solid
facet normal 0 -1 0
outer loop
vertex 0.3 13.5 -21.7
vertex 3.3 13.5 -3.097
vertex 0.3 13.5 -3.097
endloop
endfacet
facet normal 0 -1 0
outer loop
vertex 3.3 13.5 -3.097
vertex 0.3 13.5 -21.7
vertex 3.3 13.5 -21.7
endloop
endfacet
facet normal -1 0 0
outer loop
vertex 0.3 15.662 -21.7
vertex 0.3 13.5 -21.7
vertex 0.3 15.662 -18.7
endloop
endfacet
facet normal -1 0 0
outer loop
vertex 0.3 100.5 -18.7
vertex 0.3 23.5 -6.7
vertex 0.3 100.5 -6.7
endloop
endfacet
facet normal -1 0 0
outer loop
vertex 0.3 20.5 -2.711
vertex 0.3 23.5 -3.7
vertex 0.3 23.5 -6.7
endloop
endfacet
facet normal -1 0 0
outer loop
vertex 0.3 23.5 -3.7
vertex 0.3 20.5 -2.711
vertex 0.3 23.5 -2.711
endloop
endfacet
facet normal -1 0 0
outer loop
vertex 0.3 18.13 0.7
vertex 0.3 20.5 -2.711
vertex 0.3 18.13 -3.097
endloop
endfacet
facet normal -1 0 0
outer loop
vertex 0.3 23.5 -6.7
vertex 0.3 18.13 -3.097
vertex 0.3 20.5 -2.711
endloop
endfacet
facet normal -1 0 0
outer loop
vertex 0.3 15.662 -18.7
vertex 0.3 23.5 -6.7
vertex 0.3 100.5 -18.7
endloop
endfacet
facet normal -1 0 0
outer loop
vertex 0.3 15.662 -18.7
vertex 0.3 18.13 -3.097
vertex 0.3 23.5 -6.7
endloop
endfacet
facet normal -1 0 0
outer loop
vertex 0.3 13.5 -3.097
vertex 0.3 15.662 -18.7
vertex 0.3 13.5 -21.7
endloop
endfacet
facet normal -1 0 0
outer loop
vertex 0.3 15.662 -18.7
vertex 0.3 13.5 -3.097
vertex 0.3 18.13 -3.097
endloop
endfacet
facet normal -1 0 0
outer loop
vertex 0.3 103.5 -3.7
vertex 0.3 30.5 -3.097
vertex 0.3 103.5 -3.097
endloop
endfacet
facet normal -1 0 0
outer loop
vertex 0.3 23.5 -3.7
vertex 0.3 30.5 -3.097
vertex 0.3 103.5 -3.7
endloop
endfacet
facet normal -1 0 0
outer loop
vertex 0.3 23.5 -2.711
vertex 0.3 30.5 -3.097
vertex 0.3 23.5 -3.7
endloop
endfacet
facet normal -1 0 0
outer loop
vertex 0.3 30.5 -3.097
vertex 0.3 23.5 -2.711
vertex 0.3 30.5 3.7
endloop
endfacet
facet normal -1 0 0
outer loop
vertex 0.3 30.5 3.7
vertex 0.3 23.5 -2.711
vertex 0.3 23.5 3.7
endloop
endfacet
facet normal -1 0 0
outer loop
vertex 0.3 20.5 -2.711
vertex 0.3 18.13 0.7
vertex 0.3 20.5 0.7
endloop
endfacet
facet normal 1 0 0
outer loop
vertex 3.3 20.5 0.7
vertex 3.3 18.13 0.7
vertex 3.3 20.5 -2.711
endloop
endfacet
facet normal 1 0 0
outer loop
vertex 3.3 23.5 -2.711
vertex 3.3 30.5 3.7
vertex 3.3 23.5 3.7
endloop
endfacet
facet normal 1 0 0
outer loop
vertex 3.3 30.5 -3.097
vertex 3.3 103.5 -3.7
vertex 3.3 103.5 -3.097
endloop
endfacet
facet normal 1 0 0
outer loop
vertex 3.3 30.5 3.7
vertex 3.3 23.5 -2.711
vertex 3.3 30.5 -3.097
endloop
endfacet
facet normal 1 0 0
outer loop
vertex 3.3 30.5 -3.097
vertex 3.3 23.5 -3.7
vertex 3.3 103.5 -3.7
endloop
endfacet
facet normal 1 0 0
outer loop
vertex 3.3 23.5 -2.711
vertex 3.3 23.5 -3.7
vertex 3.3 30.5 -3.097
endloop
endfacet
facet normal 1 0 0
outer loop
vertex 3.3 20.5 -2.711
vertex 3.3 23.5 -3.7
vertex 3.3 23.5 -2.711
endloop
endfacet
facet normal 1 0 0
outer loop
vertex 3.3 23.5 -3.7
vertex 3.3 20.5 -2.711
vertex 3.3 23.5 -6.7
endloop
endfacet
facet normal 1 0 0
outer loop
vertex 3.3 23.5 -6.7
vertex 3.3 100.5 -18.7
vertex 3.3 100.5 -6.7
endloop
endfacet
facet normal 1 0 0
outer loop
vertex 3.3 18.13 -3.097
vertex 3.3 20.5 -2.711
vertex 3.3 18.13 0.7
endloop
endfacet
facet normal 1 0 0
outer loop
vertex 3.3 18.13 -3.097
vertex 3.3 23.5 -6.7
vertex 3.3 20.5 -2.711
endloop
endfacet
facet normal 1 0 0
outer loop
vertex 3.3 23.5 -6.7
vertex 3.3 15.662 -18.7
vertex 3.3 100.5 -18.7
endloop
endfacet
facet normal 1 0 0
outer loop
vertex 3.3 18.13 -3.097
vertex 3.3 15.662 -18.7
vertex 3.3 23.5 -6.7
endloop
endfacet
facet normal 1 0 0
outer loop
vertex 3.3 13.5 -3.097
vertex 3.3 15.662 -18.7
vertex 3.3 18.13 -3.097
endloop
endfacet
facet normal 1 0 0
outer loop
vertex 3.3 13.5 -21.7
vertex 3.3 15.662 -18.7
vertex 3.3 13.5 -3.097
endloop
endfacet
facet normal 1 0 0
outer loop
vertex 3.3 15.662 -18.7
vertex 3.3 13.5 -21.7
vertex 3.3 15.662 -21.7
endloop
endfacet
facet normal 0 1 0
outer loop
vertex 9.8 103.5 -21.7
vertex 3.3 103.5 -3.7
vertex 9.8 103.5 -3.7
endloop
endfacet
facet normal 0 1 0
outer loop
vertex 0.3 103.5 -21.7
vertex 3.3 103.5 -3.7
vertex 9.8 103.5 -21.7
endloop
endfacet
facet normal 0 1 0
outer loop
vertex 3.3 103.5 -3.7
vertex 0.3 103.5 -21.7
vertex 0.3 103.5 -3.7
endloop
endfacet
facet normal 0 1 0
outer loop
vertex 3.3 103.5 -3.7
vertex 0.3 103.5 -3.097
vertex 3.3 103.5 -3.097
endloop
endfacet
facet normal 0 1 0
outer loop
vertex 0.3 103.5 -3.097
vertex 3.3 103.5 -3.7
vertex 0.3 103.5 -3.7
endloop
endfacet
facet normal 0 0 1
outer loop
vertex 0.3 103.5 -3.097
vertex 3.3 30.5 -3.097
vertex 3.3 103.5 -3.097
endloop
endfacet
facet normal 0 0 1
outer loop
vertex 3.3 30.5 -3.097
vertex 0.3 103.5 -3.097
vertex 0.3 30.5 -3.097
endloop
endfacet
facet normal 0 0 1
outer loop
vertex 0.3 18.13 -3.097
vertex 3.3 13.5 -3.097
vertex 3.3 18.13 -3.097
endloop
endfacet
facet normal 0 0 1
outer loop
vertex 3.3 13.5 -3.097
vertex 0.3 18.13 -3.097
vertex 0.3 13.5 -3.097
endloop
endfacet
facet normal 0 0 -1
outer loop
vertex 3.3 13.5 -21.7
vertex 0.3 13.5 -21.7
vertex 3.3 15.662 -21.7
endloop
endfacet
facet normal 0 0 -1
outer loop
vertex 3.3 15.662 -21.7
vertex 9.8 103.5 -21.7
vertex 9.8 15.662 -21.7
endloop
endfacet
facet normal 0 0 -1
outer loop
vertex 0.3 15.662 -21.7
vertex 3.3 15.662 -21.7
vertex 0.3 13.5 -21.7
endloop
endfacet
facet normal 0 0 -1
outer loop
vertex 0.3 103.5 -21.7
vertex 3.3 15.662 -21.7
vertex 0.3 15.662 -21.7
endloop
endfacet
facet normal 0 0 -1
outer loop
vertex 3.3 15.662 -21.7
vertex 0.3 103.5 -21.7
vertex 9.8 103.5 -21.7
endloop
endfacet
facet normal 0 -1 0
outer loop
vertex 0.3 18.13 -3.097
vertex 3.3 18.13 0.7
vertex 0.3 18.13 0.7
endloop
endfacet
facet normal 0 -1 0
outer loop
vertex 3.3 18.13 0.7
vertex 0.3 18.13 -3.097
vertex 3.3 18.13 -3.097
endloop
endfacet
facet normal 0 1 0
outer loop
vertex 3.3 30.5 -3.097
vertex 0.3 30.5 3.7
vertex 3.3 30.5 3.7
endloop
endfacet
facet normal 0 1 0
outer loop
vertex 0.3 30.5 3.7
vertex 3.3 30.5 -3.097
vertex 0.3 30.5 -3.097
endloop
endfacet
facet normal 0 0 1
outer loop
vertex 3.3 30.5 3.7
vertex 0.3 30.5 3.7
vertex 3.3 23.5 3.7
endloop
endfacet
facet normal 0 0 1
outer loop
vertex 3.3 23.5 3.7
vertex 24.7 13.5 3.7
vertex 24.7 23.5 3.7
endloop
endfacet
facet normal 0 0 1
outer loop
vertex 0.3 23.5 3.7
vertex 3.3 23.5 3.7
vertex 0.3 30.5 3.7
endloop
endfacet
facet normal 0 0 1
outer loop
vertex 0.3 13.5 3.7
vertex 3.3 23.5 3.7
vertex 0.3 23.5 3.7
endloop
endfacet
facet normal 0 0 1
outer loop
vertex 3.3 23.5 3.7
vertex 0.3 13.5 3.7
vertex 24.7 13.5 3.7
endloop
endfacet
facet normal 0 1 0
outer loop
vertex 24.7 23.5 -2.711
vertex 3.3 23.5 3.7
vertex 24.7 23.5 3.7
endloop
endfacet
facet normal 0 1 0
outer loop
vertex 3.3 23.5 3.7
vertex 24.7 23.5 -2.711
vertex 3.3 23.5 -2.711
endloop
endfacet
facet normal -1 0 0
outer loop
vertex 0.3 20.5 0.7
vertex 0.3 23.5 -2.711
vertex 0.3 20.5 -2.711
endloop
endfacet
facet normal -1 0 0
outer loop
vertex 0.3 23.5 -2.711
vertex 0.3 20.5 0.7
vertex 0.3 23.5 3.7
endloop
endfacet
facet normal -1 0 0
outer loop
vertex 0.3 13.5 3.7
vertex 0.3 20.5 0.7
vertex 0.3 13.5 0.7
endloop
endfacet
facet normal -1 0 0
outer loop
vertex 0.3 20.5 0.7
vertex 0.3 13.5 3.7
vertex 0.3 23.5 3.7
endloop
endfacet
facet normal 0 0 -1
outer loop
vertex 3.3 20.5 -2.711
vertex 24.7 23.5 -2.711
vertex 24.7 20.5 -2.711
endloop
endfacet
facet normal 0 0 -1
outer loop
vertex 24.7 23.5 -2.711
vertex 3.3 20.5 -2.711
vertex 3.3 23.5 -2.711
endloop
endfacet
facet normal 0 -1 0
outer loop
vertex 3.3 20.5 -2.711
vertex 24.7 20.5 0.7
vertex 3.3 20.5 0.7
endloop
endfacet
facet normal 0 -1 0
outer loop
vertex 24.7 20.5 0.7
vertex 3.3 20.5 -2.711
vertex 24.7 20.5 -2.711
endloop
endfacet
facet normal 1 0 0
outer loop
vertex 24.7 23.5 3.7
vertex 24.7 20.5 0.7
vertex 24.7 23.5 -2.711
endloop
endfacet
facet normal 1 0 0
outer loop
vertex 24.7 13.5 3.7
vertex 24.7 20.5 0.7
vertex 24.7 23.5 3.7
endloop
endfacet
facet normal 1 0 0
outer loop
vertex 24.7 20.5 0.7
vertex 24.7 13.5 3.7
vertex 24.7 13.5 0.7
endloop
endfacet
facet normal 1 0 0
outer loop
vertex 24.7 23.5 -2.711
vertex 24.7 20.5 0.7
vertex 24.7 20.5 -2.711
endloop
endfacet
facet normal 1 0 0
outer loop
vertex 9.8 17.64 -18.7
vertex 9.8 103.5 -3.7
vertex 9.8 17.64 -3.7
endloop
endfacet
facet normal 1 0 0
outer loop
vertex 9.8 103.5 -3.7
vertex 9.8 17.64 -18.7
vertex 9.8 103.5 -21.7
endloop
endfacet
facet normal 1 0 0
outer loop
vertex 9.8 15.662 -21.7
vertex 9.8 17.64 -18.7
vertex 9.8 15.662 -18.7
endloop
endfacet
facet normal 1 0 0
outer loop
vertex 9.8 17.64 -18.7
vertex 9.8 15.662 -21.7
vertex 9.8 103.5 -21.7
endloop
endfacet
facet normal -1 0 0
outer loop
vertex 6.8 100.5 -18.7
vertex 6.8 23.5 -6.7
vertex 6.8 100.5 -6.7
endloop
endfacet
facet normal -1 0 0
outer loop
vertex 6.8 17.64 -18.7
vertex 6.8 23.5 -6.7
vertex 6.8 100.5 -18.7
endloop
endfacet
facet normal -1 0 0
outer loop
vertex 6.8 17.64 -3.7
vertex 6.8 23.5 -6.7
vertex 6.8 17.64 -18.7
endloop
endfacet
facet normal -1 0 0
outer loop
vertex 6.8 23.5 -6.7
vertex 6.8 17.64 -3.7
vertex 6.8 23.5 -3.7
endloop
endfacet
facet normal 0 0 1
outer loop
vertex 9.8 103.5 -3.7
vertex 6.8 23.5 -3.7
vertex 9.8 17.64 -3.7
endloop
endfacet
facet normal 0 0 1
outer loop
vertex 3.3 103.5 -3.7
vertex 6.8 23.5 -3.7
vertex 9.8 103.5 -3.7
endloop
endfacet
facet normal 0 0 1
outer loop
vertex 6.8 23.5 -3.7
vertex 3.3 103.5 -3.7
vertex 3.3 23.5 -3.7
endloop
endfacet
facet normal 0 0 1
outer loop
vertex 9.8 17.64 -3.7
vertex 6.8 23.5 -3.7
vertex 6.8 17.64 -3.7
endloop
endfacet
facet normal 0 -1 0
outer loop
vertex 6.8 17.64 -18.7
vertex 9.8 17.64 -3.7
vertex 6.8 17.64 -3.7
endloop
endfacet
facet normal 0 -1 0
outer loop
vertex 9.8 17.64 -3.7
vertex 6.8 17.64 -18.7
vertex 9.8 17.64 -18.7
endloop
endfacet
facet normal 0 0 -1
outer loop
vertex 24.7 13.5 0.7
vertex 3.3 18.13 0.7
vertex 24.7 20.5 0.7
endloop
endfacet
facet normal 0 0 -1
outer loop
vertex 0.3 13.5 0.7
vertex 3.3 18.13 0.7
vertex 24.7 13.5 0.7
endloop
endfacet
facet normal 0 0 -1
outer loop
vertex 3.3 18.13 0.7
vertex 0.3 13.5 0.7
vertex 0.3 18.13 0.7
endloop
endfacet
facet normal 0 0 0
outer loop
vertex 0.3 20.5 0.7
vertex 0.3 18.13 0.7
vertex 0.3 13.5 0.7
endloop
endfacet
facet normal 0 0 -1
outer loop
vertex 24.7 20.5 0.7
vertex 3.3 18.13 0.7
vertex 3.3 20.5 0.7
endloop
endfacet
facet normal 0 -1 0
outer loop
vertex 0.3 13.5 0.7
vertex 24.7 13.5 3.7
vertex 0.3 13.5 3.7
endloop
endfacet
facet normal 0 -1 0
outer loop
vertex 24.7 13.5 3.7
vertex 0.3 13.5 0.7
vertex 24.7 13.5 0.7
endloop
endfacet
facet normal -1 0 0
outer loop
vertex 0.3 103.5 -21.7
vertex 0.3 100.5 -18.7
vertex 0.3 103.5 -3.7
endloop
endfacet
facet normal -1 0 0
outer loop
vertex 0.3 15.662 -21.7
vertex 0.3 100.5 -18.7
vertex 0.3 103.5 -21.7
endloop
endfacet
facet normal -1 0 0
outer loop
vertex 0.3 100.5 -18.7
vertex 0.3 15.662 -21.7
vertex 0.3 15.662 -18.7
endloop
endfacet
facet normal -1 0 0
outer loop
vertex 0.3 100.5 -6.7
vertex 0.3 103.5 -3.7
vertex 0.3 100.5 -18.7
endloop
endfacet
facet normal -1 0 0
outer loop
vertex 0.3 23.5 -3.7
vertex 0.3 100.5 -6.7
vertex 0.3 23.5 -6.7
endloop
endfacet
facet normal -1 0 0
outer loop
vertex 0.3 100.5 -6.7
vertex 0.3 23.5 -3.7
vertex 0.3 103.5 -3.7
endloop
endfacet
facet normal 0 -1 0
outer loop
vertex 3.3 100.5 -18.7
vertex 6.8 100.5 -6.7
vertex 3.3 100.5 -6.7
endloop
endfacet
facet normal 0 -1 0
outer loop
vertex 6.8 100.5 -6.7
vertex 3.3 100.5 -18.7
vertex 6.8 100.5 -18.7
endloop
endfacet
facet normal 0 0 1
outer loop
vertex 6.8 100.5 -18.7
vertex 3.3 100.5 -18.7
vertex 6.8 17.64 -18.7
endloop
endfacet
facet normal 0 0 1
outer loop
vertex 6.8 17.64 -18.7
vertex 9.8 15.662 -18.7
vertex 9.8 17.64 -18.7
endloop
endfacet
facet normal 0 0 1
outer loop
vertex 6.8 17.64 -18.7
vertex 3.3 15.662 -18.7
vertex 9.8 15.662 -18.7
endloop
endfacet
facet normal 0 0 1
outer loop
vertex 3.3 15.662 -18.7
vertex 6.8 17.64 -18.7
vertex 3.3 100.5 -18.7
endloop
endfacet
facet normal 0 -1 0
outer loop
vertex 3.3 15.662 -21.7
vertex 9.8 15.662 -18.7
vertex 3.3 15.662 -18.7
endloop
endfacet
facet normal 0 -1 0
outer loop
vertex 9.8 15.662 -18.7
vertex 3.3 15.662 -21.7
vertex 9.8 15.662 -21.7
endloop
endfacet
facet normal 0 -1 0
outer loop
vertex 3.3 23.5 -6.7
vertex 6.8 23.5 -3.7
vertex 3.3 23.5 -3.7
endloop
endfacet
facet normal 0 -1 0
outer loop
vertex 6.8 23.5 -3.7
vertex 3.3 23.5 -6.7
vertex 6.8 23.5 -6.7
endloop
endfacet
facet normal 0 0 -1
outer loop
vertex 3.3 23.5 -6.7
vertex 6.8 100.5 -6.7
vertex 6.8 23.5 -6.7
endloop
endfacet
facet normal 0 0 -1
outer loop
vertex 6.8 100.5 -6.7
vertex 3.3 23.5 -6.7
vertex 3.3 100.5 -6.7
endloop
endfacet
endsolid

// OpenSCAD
% scale(1000) import("ffld_0850ncn30_lksr00_0__3.part");

// Sketch PureShapes 3
multmatrix([[-1.0, 0.0, 0.0, 0.0], [0.0, 0.0, 1.0, 23.5], [0.0, 1.0, 0.0, 0.0], [0.0, 0.0, 0.0, 1.0]]) {
thickness = 3.000000;
translate([0, 0, -thickness]) {
  translate([-0.300000, 3.700000, 0]) {
    rotate([0, 0, 180.0]) {
      cube([24.400000, 6.411395, thickness]);
    }
  }
}
}

// Sketch PureShapes 3
multmatrix([[0.0, 2.8912057932946793e-16, 1.0, 9.79999999999995], [1.0, 0.0, 0.0, 0.0], [0.0, 1.0, -2.8912057932946793e-16, -2.833381677428771e-15], [0.0, 0.0, 0.0, 1.0]]) {
thickness = 3.000000;
translate([0, 0, -thickness]) {
  translate([103.500000, -3.700000, 0]) {
    rotate([0, 0, 180.0]) {
      cube([85.859568, 18.000000, thickness]);
    }
  }
}
}

// Sketch PureShapes 3
multmatrix([[1.0, 0.0, 0.0, 0.0], [0.0, 1.0, 0.0, 0.0], [0.0, 0.0, 1.0, 3.7], [0.0, 0.0, 0.0, 1.0]]) {
thickness = 3.000000;
translate([0, 0, -thickness]) {
  translate([0.300000, 13.500000, 0]) {
    rotate([0, 0, 0.0]) {
      cube([24.400000, 10.000000, thickness]);
    }
  }
}
}

// Sketch PureShapes 3
multmatrix([[0.0, 0.0, -1.0, 0.29999999999994614], [-1.0, 0.0, 0.0, 0.0], [0.0, 1.0, 0.0, 0.0], [0.0, 0.0, 0.0, 1.0]]) {
thickness = 3.000000;
translate([0, 0, -thickness]) {
  translate([-103.500000, -21.700000, 0]) {
    rotate([0, 0, 0.0]) {
      cube([90.000000, 18.602736, thickness]);
    }
  }
  translate([-30.500000, -3.700000, 0]) {
    rotate([0, 0, 0.0]) {
      cube([12.369644, 7.400000, thickness]);
    }
  }
}
}

// Sketch PureShapes 3
multmatrix([[-1.0, 0.0, 0.0, 0.0], [0.0, 0.0, 1.0, 103.50000000000001], [0.0, 1.0, 0.0, 0.0], [0.0, 0.0, 0.0, 1.0]]) {
thickness = 3.000000;
translate([0, 0, -thickness]) {
  translate([-0.300000, -3.700000, 0]) {
    rotate([0, 0, 180.0]) {
      cube([9.500000, 18.000000, thickness]);
    }
  }
}
}

// Sketch PureShapes 3
multmatrix([[1.0, 0.0, 0.0, 0.0], [0.0, -1.0, 0.0, 0.0], [0.0, 0.0, -1.0, -21.699999999999996], [0.0, 0.0, 0.0, 1.0]]) {
thickness = 3.000000;
translate([0, 0, -thickness]) {
  translate([0.300000, -103.500000, 0]) {
    rotate([0, 0, 0.0]) {
      cube([9.500000, 87.837698, thickness]);
    }
  }
}
}

// Sketch PureShapes 3
multmatrix([[1.0, 0.0, 0.0, 0.0], [0.0, 1.0, 0.0, 0.0], [0.0, 0.0, 1.0, -3.7], [0.0, 0.0, 0.0, 1.0]]) {
thickness = 3.000000;
translate([0, 0, -thickness]) {
  translate([9.800000, 103.500000, 0]) {
    rotate([0, 0, 180.0]) {
      cube([9.500000, 80.000000, thickness]);
    }
  }
}
}
